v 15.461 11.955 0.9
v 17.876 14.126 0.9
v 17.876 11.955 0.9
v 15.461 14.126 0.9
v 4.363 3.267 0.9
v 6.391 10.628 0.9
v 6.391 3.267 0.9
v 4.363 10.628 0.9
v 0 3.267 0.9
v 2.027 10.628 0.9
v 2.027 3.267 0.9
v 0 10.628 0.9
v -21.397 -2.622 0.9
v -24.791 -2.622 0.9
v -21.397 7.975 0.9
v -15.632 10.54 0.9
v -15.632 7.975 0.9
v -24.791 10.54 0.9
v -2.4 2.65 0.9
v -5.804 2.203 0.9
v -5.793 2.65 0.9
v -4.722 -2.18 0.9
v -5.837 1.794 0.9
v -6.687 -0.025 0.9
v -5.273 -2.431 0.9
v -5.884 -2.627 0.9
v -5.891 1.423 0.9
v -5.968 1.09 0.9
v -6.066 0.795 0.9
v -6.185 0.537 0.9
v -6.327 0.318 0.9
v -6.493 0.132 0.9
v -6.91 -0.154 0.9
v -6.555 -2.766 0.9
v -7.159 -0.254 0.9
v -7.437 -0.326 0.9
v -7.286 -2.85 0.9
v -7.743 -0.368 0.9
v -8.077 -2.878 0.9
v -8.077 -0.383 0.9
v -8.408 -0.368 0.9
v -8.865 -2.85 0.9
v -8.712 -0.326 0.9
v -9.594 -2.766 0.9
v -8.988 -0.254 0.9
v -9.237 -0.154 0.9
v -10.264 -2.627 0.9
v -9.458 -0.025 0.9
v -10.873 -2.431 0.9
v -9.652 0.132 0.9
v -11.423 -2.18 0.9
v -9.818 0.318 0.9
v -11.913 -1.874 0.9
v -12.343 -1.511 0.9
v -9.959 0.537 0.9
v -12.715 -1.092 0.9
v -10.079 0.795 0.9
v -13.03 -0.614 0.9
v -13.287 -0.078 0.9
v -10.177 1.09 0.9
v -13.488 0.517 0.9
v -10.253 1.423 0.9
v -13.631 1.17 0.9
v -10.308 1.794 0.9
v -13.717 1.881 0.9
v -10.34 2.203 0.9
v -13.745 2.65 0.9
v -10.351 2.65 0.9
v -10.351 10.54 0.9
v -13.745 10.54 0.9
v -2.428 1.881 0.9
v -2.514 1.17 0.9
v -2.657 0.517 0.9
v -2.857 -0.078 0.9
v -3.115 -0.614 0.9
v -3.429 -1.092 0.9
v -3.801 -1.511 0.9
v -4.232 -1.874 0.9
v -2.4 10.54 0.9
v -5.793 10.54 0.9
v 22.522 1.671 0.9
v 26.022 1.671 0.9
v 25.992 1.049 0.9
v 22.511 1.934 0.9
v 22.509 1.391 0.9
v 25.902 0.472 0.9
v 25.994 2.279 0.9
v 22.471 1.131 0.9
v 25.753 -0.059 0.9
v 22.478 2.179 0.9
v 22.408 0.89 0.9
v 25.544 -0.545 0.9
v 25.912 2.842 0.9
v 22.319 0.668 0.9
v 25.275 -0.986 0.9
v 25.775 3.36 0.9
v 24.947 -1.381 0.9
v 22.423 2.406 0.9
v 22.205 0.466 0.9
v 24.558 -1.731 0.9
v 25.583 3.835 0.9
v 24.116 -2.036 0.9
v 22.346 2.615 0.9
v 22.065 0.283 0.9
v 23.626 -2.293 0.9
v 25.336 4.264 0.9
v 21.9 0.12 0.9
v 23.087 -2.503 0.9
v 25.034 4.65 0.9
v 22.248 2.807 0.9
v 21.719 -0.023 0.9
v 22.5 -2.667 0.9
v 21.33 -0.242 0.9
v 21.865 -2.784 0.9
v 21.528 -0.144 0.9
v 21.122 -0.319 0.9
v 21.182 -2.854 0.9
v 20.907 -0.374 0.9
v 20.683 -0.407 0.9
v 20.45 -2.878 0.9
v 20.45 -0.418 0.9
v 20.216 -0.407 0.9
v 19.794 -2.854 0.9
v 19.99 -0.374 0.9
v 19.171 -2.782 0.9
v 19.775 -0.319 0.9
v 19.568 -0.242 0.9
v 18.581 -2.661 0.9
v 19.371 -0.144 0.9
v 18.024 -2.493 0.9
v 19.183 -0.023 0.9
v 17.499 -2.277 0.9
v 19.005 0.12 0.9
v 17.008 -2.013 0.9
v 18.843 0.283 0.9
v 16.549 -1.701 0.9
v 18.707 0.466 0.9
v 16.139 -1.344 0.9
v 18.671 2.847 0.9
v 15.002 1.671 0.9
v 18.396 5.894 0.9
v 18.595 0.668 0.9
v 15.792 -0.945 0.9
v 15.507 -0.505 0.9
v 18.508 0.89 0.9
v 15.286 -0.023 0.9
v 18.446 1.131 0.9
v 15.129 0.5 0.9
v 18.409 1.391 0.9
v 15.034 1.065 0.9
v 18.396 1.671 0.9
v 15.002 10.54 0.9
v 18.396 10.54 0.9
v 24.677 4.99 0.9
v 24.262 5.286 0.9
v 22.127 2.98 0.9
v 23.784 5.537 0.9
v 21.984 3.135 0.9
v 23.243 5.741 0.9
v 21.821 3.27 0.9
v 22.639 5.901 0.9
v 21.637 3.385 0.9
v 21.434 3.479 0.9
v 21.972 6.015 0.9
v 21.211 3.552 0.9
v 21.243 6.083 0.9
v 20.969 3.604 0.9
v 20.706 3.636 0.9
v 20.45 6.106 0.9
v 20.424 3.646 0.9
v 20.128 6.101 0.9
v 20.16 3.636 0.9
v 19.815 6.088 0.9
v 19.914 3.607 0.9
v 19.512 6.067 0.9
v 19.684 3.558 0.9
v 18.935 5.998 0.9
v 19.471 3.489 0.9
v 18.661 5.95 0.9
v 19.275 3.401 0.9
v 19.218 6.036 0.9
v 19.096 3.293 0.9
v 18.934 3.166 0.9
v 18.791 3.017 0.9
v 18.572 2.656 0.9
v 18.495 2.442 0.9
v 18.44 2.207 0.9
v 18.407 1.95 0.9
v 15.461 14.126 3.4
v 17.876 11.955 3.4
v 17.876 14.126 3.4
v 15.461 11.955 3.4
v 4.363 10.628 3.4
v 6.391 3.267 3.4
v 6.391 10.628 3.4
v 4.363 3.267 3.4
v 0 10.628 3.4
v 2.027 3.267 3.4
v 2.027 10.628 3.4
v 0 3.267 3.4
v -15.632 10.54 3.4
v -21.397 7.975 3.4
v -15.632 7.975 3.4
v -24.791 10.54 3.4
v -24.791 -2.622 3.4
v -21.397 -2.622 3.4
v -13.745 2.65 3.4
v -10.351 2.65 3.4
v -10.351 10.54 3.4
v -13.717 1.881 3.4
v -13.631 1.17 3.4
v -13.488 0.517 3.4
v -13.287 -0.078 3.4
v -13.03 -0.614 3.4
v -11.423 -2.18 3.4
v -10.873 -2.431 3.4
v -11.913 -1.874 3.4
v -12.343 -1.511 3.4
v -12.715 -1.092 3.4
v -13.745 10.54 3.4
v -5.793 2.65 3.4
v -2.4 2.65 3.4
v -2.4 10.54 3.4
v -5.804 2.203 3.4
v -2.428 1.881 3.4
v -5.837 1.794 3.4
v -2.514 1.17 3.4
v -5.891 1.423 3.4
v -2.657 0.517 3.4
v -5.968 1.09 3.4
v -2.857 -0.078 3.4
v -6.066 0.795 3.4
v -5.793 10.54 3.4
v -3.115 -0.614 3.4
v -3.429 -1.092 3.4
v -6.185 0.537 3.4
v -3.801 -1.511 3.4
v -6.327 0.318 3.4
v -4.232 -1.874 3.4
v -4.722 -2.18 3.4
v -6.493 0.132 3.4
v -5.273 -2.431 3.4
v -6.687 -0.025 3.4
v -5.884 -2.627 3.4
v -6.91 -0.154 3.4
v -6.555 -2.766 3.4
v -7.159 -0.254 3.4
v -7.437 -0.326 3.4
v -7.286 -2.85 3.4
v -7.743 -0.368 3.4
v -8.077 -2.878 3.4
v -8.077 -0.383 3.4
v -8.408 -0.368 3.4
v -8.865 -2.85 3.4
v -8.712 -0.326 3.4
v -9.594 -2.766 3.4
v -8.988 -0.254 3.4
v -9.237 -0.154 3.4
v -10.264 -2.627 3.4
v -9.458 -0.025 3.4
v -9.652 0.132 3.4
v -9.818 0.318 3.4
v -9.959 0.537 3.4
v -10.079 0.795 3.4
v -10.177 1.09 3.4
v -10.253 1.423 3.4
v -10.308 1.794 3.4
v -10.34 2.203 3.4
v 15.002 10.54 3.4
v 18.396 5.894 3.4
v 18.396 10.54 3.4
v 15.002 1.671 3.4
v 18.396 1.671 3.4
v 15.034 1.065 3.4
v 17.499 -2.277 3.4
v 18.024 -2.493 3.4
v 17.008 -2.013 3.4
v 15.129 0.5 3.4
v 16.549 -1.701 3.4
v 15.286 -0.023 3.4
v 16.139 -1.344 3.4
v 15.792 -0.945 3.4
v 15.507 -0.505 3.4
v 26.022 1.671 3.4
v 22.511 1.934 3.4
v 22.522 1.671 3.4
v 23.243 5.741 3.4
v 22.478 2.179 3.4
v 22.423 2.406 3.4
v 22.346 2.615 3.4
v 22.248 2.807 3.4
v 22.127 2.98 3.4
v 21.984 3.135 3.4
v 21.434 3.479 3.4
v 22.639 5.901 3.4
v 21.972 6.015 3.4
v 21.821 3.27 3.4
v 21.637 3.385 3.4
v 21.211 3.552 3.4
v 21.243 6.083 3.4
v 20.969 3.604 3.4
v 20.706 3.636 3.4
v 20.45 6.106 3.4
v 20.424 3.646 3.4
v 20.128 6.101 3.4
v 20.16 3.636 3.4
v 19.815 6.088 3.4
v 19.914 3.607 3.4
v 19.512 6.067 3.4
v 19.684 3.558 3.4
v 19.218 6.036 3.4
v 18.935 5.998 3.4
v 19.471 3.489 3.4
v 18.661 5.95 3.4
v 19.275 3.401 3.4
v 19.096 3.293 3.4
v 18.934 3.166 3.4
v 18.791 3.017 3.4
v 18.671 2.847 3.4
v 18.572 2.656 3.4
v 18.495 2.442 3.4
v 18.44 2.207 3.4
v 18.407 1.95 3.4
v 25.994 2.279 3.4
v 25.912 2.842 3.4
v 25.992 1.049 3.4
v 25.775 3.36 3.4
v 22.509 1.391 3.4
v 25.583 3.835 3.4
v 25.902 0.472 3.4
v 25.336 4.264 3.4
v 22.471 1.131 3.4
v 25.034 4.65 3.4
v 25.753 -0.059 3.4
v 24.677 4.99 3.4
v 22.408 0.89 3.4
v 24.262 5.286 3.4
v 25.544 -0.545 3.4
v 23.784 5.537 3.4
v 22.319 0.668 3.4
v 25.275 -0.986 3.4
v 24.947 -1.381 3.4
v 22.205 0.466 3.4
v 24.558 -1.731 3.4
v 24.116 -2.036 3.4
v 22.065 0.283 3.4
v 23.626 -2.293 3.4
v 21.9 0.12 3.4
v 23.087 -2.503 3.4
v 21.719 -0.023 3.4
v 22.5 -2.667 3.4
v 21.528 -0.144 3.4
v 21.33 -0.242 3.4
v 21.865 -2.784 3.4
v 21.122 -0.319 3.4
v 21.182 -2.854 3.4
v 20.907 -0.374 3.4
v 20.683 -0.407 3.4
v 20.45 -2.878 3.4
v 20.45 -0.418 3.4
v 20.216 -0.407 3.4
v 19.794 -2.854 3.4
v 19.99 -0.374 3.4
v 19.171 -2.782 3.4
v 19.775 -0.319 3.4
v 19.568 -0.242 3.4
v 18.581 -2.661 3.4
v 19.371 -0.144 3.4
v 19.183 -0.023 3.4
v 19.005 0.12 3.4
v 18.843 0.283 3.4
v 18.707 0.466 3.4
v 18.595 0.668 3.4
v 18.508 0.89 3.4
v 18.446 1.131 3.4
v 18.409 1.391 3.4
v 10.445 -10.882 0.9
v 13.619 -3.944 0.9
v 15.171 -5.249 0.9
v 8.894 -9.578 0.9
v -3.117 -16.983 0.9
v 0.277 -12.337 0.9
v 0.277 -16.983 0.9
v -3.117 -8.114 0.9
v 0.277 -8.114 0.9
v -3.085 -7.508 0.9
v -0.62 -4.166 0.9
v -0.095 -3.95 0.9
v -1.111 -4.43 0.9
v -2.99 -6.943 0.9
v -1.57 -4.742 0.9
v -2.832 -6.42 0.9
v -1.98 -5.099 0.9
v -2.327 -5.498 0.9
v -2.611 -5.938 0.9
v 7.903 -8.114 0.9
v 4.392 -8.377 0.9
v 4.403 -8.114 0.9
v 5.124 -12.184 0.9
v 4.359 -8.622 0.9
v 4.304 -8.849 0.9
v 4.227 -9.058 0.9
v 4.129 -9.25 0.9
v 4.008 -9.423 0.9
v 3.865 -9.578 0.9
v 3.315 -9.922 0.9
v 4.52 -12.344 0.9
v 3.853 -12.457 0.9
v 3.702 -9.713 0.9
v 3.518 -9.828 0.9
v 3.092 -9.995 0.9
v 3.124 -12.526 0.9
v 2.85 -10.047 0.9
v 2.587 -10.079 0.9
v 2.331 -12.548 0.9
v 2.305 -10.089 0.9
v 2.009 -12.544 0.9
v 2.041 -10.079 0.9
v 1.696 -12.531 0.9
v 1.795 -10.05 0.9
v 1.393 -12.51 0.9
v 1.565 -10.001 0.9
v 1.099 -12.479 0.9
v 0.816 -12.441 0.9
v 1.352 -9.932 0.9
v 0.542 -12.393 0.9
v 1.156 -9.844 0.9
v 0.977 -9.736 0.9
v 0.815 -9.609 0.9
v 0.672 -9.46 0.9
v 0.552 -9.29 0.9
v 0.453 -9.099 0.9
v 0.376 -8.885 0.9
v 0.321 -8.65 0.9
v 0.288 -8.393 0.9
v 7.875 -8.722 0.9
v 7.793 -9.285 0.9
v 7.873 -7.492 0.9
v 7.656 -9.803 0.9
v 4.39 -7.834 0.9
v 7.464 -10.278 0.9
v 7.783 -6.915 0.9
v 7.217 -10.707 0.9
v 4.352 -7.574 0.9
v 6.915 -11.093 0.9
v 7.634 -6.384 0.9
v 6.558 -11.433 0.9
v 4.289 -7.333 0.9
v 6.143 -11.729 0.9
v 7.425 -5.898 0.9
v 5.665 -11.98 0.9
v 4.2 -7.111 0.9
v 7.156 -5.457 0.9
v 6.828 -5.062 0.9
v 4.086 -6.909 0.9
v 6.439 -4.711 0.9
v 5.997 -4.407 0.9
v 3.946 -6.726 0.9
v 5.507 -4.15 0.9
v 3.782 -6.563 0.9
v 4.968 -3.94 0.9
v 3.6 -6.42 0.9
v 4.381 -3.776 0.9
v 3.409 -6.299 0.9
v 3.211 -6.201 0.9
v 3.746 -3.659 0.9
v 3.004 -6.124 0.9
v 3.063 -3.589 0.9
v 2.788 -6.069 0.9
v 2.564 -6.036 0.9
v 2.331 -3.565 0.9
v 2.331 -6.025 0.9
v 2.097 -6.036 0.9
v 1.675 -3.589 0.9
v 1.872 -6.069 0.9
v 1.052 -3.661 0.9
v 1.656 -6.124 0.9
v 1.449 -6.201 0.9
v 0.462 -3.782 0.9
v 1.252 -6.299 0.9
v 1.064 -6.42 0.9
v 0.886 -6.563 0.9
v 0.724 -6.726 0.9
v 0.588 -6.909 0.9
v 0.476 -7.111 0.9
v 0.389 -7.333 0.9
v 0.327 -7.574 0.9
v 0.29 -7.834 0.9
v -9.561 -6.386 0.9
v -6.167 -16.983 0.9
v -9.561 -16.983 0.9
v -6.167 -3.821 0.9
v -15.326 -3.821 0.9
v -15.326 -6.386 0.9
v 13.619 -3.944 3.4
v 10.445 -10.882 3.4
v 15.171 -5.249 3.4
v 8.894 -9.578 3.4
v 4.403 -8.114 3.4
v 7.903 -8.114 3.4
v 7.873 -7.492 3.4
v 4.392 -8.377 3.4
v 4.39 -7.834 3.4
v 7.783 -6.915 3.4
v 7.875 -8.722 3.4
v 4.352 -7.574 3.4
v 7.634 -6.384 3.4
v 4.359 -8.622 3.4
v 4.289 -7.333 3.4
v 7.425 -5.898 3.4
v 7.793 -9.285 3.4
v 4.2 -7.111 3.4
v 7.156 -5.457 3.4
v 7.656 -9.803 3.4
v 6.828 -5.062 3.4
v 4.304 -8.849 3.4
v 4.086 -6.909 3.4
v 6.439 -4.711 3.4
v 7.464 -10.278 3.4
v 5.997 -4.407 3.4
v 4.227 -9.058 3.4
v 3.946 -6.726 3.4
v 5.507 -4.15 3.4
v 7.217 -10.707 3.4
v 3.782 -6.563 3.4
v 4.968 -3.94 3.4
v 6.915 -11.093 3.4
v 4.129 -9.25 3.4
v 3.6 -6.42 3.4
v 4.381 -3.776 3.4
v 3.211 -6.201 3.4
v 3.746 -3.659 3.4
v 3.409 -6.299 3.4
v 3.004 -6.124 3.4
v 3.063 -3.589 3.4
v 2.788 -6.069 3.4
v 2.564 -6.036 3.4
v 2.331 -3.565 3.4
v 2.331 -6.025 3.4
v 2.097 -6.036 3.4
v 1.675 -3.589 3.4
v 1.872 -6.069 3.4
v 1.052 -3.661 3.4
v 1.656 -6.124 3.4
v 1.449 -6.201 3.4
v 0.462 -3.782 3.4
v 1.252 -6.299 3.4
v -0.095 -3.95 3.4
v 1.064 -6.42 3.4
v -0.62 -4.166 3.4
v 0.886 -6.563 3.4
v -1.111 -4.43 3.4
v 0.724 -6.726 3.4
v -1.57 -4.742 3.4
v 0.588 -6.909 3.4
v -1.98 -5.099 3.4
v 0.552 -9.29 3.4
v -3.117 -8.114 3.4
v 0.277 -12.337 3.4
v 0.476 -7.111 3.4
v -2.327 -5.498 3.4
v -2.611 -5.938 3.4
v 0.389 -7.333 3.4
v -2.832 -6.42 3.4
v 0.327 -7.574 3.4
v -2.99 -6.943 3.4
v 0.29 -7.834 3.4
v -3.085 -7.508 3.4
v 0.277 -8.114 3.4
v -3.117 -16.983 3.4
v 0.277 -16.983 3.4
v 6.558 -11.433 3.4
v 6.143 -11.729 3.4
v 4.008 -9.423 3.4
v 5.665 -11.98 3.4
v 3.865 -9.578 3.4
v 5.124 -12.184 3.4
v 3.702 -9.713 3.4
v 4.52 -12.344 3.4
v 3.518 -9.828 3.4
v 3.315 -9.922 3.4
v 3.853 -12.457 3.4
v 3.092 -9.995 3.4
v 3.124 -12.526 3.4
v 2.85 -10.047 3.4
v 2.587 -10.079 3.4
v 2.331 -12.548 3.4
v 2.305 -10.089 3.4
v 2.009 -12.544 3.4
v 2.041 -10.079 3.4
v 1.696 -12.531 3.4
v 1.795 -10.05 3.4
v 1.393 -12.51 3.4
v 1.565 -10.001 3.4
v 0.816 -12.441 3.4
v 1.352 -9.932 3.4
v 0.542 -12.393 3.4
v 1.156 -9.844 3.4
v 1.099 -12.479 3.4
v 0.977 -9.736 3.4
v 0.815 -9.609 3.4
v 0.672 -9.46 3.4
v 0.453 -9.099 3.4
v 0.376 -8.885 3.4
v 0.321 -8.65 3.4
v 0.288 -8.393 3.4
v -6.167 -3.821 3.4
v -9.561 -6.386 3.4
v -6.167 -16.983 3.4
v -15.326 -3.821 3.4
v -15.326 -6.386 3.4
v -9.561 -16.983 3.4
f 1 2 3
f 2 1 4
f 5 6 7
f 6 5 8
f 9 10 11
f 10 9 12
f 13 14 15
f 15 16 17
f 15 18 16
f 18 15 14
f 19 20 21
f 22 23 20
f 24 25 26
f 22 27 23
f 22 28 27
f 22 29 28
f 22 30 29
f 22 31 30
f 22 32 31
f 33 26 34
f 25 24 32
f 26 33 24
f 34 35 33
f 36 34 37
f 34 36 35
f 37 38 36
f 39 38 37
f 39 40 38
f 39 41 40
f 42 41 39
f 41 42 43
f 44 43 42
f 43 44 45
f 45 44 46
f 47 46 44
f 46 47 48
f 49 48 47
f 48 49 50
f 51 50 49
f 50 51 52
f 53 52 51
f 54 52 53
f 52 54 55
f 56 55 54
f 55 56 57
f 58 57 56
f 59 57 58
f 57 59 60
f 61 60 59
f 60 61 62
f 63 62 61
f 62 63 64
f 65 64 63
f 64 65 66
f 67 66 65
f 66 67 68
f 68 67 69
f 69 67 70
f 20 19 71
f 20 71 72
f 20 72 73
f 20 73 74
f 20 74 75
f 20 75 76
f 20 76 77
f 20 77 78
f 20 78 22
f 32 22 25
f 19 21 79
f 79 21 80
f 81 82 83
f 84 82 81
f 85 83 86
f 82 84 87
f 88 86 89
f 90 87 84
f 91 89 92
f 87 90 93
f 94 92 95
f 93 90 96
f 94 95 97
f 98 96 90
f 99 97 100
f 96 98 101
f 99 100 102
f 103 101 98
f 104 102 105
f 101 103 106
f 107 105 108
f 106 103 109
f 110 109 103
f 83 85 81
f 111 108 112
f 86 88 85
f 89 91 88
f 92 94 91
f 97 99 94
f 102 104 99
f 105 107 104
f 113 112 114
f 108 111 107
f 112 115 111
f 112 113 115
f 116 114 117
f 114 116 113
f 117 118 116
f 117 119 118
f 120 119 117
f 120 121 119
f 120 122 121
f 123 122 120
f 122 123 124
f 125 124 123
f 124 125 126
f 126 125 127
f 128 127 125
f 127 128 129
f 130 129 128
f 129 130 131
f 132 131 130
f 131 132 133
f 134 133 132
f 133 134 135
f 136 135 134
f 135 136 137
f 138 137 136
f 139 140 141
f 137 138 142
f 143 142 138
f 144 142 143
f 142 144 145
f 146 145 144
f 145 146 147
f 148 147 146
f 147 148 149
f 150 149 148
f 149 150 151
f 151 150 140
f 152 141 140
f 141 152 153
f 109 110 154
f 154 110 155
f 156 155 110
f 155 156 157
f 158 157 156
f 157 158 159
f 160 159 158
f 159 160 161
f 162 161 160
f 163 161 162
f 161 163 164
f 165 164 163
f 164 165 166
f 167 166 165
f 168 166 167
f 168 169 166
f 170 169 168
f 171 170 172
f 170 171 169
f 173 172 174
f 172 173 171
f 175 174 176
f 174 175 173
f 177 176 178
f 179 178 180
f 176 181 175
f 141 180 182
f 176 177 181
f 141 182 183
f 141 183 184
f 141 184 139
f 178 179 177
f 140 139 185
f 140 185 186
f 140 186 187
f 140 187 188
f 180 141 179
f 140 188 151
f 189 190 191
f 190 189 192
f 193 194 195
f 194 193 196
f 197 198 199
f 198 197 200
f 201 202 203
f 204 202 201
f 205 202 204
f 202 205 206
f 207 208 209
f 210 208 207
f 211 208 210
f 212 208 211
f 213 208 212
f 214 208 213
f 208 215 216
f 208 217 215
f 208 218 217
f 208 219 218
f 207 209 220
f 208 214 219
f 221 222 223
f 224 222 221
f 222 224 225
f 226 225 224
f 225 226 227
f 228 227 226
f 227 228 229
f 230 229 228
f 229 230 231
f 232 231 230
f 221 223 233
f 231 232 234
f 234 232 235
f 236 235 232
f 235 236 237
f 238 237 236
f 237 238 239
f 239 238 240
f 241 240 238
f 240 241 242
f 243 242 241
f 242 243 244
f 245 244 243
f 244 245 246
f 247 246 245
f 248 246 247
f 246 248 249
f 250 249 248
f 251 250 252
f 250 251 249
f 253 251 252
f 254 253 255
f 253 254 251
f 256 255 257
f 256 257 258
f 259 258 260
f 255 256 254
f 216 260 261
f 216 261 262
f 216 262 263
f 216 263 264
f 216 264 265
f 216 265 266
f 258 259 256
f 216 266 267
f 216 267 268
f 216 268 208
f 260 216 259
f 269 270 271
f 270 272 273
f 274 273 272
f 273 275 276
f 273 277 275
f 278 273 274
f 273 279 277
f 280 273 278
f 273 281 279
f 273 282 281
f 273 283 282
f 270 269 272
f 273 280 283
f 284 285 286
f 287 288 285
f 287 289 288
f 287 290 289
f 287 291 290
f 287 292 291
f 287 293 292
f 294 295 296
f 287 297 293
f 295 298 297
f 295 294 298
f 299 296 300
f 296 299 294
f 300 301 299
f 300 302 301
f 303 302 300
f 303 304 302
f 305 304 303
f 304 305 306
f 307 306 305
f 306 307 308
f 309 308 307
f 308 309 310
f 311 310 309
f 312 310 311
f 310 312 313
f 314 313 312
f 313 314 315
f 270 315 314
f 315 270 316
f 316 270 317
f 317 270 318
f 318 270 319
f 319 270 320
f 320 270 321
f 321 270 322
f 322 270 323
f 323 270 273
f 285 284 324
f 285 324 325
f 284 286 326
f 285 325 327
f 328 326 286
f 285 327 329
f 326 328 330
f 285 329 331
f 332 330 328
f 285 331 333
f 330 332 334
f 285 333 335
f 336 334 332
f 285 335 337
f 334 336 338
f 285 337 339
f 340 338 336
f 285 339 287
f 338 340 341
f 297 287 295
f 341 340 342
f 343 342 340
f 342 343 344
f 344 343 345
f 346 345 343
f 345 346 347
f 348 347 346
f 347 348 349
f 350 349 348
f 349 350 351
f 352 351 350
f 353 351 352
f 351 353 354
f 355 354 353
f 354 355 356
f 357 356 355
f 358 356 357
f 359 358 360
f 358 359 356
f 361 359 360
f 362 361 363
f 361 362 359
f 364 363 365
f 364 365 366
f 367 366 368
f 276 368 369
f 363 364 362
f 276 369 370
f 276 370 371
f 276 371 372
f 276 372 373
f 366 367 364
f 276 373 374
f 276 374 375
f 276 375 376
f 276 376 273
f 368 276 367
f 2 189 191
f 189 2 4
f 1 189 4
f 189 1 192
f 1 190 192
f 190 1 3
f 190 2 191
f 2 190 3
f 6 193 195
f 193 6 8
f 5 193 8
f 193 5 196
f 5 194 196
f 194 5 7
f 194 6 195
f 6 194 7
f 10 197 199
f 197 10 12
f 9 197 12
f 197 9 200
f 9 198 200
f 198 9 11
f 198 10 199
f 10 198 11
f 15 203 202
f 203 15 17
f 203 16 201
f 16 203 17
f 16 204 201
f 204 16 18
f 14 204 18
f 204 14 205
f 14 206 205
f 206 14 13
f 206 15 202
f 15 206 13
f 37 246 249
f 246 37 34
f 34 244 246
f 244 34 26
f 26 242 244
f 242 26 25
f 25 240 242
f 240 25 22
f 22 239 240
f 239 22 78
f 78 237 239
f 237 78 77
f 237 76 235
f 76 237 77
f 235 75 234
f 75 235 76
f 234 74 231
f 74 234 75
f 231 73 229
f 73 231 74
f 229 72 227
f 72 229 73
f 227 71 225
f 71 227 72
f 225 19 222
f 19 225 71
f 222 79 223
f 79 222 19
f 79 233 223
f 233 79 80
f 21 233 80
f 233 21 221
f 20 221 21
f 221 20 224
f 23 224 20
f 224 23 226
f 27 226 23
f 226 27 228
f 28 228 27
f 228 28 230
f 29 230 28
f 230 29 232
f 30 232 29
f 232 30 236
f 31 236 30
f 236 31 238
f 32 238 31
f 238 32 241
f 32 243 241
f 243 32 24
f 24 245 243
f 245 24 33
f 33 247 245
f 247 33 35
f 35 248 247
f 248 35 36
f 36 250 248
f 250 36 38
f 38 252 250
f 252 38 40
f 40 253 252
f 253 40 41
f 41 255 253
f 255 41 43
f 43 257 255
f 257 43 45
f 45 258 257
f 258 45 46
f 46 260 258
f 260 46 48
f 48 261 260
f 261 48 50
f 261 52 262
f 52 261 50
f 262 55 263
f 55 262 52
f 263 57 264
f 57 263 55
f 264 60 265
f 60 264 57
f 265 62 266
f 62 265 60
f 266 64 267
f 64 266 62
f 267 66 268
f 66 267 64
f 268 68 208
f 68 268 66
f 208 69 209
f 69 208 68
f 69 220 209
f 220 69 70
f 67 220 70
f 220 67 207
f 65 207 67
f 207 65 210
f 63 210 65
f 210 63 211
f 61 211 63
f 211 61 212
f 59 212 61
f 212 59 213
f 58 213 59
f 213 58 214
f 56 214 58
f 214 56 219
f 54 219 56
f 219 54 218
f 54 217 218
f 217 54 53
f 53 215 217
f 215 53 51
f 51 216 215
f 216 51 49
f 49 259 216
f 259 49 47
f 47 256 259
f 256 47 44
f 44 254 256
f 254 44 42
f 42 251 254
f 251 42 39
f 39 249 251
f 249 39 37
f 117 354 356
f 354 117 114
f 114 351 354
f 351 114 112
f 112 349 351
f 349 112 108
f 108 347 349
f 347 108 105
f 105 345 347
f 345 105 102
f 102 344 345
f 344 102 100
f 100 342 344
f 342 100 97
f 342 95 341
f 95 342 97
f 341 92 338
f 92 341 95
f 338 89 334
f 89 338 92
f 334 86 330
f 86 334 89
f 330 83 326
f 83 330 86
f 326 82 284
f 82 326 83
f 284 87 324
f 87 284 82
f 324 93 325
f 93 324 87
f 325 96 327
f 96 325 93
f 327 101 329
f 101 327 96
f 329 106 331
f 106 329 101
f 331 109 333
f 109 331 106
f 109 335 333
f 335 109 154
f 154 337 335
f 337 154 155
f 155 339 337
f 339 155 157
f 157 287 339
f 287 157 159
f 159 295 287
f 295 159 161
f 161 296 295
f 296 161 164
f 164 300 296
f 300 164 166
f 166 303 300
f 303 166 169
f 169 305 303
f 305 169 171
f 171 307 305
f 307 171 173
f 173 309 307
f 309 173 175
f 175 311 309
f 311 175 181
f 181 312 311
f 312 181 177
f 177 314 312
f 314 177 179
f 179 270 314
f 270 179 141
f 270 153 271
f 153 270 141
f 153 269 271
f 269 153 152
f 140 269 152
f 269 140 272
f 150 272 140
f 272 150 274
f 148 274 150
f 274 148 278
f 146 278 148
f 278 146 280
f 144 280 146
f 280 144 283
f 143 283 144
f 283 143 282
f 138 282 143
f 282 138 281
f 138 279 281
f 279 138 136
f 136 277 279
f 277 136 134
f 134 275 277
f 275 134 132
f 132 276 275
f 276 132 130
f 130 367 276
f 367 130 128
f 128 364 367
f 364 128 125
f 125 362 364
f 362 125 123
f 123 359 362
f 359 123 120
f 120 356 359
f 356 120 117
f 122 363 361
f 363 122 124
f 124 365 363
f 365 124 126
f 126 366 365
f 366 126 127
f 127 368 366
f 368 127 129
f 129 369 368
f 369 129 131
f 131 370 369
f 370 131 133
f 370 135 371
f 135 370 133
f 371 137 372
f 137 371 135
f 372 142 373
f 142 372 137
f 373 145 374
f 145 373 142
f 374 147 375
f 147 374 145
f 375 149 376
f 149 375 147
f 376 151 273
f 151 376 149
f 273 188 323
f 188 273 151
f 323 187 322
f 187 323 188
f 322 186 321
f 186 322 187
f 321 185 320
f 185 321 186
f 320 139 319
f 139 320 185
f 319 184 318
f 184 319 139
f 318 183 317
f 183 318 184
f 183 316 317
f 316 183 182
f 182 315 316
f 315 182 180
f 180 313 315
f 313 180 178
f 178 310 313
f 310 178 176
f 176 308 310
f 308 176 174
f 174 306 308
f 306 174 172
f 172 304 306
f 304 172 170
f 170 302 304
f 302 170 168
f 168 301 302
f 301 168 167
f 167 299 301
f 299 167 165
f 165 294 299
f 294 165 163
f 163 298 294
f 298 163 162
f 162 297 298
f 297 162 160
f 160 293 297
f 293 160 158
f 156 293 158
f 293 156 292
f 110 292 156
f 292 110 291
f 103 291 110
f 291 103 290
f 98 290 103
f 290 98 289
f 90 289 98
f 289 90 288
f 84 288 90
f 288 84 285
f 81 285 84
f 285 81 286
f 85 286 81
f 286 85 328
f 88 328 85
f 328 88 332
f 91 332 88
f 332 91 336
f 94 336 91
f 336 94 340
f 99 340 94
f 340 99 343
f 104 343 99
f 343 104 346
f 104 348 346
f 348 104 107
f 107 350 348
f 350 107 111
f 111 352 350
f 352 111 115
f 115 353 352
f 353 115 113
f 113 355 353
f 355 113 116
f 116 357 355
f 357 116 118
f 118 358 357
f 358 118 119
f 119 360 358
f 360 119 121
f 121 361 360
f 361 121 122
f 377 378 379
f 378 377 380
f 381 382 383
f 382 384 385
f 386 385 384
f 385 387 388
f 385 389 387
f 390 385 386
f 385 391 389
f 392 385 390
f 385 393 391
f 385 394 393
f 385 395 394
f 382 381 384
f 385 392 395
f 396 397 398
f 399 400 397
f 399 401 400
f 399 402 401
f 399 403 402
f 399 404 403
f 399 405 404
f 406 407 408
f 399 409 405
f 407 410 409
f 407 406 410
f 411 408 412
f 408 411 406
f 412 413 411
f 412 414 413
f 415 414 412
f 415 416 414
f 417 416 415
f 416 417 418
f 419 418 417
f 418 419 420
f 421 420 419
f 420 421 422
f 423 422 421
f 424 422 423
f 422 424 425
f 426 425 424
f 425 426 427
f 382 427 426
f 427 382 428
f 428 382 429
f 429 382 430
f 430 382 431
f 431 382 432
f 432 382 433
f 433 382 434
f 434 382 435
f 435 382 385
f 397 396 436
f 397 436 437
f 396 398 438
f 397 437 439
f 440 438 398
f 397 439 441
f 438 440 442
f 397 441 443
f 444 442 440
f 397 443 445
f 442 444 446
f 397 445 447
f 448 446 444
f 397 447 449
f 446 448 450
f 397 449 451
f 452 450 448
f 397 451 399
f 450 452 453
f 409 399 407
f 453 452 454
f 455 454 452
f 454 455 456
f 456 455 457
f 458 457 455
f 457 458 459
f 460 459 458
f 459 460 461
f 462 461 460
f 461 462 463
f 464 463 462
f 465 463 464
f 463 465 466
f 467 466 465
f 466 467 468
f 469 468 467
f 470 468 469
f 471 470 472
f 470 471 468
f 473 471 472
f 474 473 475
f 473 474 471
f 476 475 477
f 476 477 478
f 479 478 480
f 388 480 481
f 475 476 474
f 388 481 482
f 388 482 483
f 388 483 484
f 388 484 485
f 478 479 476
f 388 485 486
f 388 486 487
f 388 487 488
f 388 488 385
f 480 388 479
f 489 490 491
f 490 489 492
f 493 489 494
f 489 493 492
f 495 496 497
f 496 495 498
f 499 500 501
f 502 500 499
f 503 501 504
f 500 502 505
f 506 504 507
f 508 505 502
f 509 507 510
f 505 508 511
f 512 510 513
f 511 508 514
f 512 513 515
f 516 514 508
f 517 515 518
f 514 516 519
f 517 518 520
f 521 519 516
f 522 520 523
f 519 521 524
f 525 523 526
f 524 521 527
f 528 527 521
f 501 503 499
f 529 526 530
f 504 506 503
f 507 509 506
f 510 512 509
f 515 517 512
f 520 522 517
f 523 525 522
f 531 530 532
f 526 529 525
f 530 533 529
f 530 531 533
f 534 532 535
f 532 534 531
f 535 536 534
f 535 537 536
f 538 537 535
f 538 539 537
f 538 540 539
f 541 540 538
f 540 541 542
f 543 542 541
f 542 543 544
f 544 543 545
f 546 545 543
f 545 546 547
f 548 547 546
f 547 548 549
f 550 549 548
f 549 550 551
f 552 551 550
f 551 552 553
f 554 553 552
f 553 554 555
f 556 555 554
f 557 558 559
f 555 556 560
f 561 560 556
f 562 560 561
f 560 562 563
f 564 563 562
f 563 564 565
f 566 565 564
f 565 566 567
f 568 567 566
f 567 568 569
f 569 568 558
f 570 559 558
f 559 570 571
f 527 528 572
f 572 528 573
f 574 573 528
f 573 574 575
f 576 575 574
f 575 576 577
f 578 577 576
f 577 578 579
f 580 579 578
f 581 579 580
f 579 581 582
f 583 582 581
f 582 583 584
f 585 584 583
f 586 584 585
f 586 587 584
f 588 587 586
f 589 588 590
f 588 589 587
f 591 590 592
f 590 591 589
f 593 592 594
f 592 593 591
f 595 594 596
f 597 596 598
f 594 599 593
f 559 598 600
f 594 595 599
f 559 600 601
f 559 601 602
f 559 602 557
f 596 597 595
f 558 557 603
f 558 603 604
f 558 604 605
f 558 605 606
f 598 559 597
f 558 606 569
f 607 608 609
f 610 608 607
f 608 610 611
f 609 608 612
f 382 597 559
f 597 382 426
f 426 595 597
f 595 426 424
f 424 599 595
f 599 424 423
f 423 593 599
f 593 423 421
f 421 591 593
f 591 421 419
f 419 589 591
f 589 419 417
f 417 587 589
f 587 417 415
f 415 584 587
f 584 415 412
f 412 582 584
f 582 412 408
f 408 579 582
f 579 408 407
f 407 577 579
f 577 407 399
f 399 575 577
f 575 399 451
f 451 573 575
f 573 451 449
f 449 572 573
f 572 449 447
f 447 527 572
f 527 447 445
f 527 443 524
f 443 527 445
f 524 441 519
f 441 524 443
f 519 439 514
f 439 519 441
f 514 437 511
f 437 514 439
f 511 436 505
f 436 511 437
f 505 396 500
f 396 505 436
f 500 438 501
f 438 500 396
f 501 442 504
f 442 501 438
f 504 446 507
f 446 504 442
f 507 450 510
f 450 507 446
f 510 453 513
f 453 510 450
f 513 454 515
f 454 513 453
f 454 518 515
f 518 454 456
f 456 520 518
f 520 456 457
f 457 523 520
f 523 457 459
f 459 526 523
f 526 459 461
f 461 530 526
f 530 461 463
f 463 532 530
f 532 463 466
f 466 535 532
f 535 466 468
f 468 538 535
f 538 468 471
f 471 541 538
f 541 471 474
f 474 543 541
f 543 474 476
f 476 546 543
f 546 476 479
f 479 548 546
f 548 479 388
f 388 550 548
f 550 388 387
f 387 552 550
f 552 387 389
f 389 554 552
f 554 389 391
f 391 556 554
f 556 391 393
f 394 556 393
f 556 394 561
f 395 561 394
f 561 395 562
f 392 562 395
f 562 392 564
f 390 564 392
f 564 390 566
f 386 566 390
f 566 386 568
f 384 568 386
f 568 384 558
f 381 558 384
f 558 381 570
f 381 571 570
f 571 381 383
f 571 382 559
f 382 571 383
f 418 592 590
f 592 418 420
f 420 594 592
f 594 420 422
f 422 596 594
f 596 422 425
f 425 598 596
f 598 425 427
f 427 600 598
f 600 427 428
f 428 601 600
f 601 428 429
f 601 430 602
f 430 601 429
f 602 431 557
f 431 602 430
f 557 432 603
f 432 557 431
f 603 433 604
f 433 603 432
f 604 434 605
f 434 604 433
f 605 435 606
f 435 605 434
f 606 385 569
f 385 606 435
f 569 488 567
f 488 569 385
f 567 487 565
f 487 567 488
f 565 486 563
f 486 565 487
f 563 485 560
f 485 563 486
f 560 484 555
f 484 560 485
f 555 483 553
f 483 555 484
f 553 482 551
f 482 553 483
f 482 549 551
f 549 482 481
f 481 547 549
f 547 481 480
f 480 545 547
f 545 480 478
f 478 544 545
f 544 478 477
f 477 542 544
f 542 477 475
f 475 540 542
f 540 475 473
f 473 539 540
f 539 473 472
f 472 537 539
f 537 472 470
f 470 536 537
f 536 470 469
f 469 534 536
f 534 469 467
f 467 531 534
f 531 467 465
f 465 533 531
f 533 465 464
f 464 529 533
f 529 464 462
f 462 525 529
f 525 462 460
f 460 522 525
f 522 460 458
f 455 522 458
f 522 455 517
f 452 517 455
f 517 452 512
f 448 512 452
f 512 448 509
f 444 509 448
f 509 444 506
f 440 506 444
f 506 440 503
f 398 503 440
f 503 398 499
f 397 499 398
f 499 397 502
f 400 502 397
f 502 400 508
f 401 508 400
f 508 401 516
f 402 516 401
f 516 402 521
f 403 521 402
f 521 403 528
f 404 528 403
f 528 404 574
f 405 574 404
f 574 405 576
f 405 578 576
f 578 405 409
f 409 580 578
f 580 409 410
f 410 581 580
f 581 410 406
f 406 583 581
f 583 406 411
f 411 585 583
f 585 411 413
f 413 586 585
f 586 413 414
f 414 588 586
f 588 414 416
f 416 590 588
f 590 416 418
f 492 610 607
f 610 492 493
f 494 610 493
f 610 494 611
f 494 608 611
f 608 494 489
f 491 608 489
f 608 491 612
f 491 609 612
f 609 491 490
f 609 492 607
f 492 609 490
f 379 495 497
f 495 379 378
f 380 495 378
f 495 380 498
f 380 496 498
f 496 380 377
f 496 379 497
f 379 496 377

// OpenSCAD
$fn = 48;
  // syllabics (overlaid on icon, tallest)
  translate([0, 5.430, 0.900]) linear_extrude(height=2.500) text("ᒥᑌᐦ ᑳ", size=13.000, halign="center", valign="center", font="Euphemia UCAS:style=Bold");
  translate([0, -10.430, 0.900]) linear_extrude(height=2.500) text("ᒣᑭᐟ", size=13.000, halign="center", valign="center", font="Euphemia UCAS:style=Bold");
